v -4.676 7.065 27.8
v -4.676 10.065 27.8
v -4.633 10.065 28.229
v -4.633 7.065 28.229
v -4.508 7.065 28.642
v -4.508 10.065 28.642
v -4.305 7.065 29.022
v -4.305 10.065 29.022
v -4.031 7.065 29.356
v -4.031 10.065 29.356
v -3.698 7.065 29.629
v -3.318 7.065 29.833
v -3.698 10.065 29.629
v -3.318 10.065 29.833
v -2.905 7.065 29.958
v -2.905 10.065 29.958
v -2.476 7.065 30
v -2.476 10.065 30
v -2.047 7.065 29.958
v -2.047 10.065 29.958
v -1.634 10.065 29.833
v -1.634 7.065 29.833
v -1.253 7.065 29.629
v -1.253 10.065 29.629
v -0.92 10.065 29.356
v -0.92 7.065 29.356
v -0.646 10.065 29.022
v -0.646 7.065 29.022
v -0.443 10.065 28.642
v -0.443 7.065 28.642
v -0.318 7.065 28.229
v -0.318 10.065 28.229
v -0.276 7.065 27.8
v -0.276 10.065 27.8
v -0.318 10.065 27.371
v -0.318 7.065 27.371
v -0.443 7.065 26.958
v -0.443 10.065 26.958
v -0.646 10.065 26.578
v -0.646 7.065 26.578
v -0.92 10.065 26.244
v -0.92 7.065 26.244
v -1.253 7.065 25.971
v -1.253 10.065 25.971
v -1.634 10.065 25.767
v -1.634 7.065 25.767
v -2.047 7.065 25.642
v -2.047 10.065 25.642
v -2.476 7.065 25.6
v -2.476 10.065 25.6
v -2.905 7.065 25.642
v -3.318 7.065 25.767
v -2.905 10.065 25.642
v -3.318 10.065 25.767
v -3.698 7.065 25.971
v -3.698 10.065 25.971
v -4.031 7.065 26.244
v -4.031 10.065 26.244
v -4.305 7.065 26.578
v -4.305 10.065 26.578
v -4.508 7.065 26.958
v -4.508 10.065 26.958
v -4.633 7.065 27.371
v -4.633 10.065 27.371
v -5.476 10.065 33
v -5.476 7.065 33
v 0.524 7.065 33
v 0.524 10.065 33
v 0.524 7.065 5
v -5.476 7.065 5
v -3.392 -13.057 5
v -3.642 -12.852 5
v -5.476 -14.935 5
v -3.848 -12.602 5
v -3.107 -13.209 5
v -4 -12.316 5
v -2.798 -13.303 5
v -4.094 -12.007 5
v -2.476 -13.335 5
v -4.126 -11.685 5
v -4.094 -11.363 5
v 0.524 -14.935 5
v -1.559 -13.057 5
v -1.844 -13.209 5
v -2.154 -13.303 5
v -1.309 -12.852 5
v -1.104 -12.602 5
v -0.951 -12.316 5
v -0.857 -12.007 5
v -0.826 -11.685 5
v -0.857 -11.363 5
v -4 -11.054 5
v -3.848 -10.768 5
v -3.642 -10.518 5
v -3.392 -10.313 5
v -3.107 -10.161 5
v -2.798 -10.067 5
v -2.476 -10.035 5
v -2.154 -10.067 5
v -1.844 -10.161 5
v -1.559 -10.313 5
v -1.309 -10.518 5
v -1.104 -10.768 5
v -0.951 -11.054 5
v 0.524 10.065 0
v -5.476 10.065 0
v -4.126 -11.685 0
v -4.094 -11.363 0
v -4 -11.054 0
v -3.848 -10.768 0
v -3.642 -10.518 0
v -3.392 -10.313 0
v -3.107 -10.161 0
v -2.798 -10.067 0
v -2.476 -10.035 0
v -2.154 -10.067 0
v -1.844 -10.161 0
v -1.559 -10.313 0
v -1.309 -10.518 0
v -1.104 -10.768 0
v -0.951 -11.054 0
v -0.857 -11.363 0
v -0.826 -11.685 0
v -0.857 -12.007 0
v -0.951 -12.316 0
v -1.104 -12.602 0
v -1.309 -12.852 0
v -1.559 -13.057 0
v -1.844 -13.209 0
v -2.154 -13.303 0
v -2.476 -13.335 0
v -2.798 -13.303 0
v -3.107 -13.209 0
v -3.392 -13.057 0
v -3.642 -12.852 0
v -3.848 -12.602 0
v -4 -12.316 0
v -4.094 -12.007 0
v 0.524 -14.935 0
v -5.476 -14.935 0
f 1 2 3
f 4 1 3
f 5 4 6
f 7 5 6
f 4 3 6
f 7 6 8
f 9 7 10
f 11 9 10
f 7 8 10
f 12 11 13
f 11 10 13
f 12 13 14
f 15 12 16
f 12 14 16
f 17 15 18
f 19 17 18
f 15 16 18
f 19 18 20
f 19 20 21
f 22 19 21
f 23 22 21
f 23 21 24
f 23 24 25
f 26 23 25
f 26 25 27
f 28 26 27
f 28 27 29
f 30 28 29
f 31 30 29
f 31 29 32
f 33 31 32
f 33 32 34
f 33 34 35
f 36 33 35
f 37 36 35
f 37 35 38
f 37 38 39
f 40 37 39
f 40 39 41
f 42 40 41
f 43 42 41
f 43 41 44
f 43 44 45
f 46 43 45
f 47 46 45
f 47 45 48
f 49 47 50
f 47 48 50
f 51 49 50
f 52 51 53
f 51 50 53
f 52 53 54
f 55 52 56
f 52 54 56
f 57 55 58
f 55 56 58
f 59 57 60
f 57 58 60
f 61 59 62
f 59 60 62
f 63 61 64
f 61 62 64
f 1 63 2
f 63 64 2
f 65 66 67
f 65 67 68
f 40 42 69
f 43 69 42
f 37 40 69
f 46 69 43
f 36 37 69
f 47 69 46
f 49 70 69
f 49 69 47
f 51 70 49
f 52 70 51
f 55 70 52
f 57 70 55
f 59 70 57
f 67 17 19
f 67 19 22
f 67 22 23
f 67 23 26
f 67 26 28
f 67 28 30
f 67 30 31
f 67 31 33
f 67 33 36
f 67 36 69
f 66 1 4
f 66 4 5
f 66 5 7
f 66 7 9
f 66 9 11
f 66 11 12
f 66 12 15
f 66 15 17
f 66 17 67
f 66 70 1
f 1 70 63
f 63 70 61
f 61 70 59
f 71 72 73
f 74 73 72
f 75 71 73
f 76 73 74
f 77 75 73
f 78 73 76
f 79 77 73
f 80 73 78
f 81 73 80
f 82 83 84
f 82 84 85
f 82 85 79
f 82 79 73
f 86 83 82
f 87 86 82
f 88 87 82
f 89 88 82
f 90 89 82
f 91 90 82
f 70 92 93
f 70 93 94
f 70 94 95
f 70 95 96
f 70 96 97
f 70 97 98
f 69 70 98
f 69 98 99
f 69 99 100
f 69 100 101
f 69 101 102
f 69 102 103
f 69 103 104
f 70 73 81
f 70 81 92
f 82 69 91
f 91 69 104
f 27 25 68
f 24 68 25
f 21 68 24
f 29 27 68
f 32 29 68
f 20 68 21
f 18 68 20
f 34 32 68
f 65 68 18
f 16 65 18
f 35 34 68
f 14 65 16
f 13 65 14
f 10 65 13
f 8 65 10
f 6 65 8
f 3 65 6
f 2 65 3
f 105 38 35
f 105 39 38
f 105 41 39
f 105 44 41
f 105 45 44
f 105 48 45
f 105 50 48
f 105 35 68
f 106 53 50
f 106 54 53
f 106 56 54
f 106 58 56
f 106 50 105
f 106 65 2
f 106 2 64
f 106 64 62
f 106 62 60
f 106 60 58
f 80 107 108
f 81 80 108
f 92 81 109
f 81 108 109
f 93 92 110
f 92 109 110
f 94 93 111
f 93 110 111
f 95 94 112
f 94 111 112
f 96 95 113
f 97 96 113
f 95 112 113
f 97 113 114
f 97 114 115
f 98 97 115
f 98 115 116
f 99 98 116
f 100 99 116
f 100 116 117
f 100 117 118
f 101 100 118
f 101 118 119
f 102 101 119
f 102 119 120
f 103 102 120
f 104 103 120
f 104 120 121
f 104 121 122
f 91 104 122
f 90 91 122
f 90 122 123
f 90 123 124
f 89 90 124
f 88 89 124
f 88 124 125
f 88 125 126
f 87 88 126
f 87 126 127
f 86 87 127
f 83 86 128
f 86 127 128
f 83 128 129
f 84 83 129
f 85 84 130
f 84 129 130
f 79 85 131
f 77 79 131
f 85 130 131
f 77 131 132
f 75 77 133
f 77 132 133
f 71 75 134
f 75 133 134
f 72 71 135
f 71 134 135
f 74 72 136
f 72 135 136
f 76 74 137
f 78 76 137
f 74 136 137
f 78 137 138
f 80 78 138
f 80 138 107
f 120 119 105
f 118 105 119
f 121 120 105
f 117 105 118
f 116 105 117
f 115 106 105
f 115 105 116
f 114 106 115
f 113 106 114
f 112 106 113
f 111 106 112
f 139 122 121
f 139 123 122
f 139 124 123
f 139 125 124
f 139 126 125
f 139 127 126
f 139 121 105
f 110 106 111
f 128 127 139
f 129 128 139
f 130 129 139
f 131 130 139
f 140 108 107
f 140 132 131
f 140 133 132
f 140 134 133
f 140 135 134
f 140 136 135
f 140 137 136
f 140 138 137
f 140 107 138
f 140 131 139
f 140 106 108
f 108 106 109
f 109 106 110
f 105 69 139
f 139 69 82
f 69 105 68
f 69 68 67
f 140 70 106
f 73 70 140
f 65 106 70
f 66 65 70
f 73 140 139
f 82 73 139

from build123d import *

# Parameters (mm, degrees)
F0_W     = 6
F0_H     = 22
F1_DEPTH = 5
F3_DEPTH = 6
F5_D     = 3.3
F7_D     = 4.4


with BuildPart() as f1:
    # F0 (on Top) → F1 (new body)
    with BuildSketch(Plane.XY):
        with Locations((-2.4757032864, -3.9350604638)):
            Rectangle(F0_W, F0_H)
    extrude(amount=F1_DEPTH)

    # F2 (on face) → F3 (join)
    with BuildSketch(Plane(origin=(-5.4757032864, 0, 0), x_dir=(0, -1, 0), z_dir=(-1, 0, 0))):
        Polygon((-10.0649395362, 0), (-7.0649395362, 0), (-7.0649395362, 5), (-7.0649395362, 33), (-10.0649395362, 33), align=None)
    extrude(amount=-F3_DEPTH)

    # F5 (through all)
    with Locations(Plane.XY.offset(5)):
        with Locations((-2.4757032864, -11.6850604638)):
            Hole(F5_D / 2)

    # F7 (through all)
    with Locations(Plane.XZ.offset(-7.0649395362)):
        with Locations((-2.4757032864, 27.8)):
            Hole(F7_D / 2)


solid = f1.part
